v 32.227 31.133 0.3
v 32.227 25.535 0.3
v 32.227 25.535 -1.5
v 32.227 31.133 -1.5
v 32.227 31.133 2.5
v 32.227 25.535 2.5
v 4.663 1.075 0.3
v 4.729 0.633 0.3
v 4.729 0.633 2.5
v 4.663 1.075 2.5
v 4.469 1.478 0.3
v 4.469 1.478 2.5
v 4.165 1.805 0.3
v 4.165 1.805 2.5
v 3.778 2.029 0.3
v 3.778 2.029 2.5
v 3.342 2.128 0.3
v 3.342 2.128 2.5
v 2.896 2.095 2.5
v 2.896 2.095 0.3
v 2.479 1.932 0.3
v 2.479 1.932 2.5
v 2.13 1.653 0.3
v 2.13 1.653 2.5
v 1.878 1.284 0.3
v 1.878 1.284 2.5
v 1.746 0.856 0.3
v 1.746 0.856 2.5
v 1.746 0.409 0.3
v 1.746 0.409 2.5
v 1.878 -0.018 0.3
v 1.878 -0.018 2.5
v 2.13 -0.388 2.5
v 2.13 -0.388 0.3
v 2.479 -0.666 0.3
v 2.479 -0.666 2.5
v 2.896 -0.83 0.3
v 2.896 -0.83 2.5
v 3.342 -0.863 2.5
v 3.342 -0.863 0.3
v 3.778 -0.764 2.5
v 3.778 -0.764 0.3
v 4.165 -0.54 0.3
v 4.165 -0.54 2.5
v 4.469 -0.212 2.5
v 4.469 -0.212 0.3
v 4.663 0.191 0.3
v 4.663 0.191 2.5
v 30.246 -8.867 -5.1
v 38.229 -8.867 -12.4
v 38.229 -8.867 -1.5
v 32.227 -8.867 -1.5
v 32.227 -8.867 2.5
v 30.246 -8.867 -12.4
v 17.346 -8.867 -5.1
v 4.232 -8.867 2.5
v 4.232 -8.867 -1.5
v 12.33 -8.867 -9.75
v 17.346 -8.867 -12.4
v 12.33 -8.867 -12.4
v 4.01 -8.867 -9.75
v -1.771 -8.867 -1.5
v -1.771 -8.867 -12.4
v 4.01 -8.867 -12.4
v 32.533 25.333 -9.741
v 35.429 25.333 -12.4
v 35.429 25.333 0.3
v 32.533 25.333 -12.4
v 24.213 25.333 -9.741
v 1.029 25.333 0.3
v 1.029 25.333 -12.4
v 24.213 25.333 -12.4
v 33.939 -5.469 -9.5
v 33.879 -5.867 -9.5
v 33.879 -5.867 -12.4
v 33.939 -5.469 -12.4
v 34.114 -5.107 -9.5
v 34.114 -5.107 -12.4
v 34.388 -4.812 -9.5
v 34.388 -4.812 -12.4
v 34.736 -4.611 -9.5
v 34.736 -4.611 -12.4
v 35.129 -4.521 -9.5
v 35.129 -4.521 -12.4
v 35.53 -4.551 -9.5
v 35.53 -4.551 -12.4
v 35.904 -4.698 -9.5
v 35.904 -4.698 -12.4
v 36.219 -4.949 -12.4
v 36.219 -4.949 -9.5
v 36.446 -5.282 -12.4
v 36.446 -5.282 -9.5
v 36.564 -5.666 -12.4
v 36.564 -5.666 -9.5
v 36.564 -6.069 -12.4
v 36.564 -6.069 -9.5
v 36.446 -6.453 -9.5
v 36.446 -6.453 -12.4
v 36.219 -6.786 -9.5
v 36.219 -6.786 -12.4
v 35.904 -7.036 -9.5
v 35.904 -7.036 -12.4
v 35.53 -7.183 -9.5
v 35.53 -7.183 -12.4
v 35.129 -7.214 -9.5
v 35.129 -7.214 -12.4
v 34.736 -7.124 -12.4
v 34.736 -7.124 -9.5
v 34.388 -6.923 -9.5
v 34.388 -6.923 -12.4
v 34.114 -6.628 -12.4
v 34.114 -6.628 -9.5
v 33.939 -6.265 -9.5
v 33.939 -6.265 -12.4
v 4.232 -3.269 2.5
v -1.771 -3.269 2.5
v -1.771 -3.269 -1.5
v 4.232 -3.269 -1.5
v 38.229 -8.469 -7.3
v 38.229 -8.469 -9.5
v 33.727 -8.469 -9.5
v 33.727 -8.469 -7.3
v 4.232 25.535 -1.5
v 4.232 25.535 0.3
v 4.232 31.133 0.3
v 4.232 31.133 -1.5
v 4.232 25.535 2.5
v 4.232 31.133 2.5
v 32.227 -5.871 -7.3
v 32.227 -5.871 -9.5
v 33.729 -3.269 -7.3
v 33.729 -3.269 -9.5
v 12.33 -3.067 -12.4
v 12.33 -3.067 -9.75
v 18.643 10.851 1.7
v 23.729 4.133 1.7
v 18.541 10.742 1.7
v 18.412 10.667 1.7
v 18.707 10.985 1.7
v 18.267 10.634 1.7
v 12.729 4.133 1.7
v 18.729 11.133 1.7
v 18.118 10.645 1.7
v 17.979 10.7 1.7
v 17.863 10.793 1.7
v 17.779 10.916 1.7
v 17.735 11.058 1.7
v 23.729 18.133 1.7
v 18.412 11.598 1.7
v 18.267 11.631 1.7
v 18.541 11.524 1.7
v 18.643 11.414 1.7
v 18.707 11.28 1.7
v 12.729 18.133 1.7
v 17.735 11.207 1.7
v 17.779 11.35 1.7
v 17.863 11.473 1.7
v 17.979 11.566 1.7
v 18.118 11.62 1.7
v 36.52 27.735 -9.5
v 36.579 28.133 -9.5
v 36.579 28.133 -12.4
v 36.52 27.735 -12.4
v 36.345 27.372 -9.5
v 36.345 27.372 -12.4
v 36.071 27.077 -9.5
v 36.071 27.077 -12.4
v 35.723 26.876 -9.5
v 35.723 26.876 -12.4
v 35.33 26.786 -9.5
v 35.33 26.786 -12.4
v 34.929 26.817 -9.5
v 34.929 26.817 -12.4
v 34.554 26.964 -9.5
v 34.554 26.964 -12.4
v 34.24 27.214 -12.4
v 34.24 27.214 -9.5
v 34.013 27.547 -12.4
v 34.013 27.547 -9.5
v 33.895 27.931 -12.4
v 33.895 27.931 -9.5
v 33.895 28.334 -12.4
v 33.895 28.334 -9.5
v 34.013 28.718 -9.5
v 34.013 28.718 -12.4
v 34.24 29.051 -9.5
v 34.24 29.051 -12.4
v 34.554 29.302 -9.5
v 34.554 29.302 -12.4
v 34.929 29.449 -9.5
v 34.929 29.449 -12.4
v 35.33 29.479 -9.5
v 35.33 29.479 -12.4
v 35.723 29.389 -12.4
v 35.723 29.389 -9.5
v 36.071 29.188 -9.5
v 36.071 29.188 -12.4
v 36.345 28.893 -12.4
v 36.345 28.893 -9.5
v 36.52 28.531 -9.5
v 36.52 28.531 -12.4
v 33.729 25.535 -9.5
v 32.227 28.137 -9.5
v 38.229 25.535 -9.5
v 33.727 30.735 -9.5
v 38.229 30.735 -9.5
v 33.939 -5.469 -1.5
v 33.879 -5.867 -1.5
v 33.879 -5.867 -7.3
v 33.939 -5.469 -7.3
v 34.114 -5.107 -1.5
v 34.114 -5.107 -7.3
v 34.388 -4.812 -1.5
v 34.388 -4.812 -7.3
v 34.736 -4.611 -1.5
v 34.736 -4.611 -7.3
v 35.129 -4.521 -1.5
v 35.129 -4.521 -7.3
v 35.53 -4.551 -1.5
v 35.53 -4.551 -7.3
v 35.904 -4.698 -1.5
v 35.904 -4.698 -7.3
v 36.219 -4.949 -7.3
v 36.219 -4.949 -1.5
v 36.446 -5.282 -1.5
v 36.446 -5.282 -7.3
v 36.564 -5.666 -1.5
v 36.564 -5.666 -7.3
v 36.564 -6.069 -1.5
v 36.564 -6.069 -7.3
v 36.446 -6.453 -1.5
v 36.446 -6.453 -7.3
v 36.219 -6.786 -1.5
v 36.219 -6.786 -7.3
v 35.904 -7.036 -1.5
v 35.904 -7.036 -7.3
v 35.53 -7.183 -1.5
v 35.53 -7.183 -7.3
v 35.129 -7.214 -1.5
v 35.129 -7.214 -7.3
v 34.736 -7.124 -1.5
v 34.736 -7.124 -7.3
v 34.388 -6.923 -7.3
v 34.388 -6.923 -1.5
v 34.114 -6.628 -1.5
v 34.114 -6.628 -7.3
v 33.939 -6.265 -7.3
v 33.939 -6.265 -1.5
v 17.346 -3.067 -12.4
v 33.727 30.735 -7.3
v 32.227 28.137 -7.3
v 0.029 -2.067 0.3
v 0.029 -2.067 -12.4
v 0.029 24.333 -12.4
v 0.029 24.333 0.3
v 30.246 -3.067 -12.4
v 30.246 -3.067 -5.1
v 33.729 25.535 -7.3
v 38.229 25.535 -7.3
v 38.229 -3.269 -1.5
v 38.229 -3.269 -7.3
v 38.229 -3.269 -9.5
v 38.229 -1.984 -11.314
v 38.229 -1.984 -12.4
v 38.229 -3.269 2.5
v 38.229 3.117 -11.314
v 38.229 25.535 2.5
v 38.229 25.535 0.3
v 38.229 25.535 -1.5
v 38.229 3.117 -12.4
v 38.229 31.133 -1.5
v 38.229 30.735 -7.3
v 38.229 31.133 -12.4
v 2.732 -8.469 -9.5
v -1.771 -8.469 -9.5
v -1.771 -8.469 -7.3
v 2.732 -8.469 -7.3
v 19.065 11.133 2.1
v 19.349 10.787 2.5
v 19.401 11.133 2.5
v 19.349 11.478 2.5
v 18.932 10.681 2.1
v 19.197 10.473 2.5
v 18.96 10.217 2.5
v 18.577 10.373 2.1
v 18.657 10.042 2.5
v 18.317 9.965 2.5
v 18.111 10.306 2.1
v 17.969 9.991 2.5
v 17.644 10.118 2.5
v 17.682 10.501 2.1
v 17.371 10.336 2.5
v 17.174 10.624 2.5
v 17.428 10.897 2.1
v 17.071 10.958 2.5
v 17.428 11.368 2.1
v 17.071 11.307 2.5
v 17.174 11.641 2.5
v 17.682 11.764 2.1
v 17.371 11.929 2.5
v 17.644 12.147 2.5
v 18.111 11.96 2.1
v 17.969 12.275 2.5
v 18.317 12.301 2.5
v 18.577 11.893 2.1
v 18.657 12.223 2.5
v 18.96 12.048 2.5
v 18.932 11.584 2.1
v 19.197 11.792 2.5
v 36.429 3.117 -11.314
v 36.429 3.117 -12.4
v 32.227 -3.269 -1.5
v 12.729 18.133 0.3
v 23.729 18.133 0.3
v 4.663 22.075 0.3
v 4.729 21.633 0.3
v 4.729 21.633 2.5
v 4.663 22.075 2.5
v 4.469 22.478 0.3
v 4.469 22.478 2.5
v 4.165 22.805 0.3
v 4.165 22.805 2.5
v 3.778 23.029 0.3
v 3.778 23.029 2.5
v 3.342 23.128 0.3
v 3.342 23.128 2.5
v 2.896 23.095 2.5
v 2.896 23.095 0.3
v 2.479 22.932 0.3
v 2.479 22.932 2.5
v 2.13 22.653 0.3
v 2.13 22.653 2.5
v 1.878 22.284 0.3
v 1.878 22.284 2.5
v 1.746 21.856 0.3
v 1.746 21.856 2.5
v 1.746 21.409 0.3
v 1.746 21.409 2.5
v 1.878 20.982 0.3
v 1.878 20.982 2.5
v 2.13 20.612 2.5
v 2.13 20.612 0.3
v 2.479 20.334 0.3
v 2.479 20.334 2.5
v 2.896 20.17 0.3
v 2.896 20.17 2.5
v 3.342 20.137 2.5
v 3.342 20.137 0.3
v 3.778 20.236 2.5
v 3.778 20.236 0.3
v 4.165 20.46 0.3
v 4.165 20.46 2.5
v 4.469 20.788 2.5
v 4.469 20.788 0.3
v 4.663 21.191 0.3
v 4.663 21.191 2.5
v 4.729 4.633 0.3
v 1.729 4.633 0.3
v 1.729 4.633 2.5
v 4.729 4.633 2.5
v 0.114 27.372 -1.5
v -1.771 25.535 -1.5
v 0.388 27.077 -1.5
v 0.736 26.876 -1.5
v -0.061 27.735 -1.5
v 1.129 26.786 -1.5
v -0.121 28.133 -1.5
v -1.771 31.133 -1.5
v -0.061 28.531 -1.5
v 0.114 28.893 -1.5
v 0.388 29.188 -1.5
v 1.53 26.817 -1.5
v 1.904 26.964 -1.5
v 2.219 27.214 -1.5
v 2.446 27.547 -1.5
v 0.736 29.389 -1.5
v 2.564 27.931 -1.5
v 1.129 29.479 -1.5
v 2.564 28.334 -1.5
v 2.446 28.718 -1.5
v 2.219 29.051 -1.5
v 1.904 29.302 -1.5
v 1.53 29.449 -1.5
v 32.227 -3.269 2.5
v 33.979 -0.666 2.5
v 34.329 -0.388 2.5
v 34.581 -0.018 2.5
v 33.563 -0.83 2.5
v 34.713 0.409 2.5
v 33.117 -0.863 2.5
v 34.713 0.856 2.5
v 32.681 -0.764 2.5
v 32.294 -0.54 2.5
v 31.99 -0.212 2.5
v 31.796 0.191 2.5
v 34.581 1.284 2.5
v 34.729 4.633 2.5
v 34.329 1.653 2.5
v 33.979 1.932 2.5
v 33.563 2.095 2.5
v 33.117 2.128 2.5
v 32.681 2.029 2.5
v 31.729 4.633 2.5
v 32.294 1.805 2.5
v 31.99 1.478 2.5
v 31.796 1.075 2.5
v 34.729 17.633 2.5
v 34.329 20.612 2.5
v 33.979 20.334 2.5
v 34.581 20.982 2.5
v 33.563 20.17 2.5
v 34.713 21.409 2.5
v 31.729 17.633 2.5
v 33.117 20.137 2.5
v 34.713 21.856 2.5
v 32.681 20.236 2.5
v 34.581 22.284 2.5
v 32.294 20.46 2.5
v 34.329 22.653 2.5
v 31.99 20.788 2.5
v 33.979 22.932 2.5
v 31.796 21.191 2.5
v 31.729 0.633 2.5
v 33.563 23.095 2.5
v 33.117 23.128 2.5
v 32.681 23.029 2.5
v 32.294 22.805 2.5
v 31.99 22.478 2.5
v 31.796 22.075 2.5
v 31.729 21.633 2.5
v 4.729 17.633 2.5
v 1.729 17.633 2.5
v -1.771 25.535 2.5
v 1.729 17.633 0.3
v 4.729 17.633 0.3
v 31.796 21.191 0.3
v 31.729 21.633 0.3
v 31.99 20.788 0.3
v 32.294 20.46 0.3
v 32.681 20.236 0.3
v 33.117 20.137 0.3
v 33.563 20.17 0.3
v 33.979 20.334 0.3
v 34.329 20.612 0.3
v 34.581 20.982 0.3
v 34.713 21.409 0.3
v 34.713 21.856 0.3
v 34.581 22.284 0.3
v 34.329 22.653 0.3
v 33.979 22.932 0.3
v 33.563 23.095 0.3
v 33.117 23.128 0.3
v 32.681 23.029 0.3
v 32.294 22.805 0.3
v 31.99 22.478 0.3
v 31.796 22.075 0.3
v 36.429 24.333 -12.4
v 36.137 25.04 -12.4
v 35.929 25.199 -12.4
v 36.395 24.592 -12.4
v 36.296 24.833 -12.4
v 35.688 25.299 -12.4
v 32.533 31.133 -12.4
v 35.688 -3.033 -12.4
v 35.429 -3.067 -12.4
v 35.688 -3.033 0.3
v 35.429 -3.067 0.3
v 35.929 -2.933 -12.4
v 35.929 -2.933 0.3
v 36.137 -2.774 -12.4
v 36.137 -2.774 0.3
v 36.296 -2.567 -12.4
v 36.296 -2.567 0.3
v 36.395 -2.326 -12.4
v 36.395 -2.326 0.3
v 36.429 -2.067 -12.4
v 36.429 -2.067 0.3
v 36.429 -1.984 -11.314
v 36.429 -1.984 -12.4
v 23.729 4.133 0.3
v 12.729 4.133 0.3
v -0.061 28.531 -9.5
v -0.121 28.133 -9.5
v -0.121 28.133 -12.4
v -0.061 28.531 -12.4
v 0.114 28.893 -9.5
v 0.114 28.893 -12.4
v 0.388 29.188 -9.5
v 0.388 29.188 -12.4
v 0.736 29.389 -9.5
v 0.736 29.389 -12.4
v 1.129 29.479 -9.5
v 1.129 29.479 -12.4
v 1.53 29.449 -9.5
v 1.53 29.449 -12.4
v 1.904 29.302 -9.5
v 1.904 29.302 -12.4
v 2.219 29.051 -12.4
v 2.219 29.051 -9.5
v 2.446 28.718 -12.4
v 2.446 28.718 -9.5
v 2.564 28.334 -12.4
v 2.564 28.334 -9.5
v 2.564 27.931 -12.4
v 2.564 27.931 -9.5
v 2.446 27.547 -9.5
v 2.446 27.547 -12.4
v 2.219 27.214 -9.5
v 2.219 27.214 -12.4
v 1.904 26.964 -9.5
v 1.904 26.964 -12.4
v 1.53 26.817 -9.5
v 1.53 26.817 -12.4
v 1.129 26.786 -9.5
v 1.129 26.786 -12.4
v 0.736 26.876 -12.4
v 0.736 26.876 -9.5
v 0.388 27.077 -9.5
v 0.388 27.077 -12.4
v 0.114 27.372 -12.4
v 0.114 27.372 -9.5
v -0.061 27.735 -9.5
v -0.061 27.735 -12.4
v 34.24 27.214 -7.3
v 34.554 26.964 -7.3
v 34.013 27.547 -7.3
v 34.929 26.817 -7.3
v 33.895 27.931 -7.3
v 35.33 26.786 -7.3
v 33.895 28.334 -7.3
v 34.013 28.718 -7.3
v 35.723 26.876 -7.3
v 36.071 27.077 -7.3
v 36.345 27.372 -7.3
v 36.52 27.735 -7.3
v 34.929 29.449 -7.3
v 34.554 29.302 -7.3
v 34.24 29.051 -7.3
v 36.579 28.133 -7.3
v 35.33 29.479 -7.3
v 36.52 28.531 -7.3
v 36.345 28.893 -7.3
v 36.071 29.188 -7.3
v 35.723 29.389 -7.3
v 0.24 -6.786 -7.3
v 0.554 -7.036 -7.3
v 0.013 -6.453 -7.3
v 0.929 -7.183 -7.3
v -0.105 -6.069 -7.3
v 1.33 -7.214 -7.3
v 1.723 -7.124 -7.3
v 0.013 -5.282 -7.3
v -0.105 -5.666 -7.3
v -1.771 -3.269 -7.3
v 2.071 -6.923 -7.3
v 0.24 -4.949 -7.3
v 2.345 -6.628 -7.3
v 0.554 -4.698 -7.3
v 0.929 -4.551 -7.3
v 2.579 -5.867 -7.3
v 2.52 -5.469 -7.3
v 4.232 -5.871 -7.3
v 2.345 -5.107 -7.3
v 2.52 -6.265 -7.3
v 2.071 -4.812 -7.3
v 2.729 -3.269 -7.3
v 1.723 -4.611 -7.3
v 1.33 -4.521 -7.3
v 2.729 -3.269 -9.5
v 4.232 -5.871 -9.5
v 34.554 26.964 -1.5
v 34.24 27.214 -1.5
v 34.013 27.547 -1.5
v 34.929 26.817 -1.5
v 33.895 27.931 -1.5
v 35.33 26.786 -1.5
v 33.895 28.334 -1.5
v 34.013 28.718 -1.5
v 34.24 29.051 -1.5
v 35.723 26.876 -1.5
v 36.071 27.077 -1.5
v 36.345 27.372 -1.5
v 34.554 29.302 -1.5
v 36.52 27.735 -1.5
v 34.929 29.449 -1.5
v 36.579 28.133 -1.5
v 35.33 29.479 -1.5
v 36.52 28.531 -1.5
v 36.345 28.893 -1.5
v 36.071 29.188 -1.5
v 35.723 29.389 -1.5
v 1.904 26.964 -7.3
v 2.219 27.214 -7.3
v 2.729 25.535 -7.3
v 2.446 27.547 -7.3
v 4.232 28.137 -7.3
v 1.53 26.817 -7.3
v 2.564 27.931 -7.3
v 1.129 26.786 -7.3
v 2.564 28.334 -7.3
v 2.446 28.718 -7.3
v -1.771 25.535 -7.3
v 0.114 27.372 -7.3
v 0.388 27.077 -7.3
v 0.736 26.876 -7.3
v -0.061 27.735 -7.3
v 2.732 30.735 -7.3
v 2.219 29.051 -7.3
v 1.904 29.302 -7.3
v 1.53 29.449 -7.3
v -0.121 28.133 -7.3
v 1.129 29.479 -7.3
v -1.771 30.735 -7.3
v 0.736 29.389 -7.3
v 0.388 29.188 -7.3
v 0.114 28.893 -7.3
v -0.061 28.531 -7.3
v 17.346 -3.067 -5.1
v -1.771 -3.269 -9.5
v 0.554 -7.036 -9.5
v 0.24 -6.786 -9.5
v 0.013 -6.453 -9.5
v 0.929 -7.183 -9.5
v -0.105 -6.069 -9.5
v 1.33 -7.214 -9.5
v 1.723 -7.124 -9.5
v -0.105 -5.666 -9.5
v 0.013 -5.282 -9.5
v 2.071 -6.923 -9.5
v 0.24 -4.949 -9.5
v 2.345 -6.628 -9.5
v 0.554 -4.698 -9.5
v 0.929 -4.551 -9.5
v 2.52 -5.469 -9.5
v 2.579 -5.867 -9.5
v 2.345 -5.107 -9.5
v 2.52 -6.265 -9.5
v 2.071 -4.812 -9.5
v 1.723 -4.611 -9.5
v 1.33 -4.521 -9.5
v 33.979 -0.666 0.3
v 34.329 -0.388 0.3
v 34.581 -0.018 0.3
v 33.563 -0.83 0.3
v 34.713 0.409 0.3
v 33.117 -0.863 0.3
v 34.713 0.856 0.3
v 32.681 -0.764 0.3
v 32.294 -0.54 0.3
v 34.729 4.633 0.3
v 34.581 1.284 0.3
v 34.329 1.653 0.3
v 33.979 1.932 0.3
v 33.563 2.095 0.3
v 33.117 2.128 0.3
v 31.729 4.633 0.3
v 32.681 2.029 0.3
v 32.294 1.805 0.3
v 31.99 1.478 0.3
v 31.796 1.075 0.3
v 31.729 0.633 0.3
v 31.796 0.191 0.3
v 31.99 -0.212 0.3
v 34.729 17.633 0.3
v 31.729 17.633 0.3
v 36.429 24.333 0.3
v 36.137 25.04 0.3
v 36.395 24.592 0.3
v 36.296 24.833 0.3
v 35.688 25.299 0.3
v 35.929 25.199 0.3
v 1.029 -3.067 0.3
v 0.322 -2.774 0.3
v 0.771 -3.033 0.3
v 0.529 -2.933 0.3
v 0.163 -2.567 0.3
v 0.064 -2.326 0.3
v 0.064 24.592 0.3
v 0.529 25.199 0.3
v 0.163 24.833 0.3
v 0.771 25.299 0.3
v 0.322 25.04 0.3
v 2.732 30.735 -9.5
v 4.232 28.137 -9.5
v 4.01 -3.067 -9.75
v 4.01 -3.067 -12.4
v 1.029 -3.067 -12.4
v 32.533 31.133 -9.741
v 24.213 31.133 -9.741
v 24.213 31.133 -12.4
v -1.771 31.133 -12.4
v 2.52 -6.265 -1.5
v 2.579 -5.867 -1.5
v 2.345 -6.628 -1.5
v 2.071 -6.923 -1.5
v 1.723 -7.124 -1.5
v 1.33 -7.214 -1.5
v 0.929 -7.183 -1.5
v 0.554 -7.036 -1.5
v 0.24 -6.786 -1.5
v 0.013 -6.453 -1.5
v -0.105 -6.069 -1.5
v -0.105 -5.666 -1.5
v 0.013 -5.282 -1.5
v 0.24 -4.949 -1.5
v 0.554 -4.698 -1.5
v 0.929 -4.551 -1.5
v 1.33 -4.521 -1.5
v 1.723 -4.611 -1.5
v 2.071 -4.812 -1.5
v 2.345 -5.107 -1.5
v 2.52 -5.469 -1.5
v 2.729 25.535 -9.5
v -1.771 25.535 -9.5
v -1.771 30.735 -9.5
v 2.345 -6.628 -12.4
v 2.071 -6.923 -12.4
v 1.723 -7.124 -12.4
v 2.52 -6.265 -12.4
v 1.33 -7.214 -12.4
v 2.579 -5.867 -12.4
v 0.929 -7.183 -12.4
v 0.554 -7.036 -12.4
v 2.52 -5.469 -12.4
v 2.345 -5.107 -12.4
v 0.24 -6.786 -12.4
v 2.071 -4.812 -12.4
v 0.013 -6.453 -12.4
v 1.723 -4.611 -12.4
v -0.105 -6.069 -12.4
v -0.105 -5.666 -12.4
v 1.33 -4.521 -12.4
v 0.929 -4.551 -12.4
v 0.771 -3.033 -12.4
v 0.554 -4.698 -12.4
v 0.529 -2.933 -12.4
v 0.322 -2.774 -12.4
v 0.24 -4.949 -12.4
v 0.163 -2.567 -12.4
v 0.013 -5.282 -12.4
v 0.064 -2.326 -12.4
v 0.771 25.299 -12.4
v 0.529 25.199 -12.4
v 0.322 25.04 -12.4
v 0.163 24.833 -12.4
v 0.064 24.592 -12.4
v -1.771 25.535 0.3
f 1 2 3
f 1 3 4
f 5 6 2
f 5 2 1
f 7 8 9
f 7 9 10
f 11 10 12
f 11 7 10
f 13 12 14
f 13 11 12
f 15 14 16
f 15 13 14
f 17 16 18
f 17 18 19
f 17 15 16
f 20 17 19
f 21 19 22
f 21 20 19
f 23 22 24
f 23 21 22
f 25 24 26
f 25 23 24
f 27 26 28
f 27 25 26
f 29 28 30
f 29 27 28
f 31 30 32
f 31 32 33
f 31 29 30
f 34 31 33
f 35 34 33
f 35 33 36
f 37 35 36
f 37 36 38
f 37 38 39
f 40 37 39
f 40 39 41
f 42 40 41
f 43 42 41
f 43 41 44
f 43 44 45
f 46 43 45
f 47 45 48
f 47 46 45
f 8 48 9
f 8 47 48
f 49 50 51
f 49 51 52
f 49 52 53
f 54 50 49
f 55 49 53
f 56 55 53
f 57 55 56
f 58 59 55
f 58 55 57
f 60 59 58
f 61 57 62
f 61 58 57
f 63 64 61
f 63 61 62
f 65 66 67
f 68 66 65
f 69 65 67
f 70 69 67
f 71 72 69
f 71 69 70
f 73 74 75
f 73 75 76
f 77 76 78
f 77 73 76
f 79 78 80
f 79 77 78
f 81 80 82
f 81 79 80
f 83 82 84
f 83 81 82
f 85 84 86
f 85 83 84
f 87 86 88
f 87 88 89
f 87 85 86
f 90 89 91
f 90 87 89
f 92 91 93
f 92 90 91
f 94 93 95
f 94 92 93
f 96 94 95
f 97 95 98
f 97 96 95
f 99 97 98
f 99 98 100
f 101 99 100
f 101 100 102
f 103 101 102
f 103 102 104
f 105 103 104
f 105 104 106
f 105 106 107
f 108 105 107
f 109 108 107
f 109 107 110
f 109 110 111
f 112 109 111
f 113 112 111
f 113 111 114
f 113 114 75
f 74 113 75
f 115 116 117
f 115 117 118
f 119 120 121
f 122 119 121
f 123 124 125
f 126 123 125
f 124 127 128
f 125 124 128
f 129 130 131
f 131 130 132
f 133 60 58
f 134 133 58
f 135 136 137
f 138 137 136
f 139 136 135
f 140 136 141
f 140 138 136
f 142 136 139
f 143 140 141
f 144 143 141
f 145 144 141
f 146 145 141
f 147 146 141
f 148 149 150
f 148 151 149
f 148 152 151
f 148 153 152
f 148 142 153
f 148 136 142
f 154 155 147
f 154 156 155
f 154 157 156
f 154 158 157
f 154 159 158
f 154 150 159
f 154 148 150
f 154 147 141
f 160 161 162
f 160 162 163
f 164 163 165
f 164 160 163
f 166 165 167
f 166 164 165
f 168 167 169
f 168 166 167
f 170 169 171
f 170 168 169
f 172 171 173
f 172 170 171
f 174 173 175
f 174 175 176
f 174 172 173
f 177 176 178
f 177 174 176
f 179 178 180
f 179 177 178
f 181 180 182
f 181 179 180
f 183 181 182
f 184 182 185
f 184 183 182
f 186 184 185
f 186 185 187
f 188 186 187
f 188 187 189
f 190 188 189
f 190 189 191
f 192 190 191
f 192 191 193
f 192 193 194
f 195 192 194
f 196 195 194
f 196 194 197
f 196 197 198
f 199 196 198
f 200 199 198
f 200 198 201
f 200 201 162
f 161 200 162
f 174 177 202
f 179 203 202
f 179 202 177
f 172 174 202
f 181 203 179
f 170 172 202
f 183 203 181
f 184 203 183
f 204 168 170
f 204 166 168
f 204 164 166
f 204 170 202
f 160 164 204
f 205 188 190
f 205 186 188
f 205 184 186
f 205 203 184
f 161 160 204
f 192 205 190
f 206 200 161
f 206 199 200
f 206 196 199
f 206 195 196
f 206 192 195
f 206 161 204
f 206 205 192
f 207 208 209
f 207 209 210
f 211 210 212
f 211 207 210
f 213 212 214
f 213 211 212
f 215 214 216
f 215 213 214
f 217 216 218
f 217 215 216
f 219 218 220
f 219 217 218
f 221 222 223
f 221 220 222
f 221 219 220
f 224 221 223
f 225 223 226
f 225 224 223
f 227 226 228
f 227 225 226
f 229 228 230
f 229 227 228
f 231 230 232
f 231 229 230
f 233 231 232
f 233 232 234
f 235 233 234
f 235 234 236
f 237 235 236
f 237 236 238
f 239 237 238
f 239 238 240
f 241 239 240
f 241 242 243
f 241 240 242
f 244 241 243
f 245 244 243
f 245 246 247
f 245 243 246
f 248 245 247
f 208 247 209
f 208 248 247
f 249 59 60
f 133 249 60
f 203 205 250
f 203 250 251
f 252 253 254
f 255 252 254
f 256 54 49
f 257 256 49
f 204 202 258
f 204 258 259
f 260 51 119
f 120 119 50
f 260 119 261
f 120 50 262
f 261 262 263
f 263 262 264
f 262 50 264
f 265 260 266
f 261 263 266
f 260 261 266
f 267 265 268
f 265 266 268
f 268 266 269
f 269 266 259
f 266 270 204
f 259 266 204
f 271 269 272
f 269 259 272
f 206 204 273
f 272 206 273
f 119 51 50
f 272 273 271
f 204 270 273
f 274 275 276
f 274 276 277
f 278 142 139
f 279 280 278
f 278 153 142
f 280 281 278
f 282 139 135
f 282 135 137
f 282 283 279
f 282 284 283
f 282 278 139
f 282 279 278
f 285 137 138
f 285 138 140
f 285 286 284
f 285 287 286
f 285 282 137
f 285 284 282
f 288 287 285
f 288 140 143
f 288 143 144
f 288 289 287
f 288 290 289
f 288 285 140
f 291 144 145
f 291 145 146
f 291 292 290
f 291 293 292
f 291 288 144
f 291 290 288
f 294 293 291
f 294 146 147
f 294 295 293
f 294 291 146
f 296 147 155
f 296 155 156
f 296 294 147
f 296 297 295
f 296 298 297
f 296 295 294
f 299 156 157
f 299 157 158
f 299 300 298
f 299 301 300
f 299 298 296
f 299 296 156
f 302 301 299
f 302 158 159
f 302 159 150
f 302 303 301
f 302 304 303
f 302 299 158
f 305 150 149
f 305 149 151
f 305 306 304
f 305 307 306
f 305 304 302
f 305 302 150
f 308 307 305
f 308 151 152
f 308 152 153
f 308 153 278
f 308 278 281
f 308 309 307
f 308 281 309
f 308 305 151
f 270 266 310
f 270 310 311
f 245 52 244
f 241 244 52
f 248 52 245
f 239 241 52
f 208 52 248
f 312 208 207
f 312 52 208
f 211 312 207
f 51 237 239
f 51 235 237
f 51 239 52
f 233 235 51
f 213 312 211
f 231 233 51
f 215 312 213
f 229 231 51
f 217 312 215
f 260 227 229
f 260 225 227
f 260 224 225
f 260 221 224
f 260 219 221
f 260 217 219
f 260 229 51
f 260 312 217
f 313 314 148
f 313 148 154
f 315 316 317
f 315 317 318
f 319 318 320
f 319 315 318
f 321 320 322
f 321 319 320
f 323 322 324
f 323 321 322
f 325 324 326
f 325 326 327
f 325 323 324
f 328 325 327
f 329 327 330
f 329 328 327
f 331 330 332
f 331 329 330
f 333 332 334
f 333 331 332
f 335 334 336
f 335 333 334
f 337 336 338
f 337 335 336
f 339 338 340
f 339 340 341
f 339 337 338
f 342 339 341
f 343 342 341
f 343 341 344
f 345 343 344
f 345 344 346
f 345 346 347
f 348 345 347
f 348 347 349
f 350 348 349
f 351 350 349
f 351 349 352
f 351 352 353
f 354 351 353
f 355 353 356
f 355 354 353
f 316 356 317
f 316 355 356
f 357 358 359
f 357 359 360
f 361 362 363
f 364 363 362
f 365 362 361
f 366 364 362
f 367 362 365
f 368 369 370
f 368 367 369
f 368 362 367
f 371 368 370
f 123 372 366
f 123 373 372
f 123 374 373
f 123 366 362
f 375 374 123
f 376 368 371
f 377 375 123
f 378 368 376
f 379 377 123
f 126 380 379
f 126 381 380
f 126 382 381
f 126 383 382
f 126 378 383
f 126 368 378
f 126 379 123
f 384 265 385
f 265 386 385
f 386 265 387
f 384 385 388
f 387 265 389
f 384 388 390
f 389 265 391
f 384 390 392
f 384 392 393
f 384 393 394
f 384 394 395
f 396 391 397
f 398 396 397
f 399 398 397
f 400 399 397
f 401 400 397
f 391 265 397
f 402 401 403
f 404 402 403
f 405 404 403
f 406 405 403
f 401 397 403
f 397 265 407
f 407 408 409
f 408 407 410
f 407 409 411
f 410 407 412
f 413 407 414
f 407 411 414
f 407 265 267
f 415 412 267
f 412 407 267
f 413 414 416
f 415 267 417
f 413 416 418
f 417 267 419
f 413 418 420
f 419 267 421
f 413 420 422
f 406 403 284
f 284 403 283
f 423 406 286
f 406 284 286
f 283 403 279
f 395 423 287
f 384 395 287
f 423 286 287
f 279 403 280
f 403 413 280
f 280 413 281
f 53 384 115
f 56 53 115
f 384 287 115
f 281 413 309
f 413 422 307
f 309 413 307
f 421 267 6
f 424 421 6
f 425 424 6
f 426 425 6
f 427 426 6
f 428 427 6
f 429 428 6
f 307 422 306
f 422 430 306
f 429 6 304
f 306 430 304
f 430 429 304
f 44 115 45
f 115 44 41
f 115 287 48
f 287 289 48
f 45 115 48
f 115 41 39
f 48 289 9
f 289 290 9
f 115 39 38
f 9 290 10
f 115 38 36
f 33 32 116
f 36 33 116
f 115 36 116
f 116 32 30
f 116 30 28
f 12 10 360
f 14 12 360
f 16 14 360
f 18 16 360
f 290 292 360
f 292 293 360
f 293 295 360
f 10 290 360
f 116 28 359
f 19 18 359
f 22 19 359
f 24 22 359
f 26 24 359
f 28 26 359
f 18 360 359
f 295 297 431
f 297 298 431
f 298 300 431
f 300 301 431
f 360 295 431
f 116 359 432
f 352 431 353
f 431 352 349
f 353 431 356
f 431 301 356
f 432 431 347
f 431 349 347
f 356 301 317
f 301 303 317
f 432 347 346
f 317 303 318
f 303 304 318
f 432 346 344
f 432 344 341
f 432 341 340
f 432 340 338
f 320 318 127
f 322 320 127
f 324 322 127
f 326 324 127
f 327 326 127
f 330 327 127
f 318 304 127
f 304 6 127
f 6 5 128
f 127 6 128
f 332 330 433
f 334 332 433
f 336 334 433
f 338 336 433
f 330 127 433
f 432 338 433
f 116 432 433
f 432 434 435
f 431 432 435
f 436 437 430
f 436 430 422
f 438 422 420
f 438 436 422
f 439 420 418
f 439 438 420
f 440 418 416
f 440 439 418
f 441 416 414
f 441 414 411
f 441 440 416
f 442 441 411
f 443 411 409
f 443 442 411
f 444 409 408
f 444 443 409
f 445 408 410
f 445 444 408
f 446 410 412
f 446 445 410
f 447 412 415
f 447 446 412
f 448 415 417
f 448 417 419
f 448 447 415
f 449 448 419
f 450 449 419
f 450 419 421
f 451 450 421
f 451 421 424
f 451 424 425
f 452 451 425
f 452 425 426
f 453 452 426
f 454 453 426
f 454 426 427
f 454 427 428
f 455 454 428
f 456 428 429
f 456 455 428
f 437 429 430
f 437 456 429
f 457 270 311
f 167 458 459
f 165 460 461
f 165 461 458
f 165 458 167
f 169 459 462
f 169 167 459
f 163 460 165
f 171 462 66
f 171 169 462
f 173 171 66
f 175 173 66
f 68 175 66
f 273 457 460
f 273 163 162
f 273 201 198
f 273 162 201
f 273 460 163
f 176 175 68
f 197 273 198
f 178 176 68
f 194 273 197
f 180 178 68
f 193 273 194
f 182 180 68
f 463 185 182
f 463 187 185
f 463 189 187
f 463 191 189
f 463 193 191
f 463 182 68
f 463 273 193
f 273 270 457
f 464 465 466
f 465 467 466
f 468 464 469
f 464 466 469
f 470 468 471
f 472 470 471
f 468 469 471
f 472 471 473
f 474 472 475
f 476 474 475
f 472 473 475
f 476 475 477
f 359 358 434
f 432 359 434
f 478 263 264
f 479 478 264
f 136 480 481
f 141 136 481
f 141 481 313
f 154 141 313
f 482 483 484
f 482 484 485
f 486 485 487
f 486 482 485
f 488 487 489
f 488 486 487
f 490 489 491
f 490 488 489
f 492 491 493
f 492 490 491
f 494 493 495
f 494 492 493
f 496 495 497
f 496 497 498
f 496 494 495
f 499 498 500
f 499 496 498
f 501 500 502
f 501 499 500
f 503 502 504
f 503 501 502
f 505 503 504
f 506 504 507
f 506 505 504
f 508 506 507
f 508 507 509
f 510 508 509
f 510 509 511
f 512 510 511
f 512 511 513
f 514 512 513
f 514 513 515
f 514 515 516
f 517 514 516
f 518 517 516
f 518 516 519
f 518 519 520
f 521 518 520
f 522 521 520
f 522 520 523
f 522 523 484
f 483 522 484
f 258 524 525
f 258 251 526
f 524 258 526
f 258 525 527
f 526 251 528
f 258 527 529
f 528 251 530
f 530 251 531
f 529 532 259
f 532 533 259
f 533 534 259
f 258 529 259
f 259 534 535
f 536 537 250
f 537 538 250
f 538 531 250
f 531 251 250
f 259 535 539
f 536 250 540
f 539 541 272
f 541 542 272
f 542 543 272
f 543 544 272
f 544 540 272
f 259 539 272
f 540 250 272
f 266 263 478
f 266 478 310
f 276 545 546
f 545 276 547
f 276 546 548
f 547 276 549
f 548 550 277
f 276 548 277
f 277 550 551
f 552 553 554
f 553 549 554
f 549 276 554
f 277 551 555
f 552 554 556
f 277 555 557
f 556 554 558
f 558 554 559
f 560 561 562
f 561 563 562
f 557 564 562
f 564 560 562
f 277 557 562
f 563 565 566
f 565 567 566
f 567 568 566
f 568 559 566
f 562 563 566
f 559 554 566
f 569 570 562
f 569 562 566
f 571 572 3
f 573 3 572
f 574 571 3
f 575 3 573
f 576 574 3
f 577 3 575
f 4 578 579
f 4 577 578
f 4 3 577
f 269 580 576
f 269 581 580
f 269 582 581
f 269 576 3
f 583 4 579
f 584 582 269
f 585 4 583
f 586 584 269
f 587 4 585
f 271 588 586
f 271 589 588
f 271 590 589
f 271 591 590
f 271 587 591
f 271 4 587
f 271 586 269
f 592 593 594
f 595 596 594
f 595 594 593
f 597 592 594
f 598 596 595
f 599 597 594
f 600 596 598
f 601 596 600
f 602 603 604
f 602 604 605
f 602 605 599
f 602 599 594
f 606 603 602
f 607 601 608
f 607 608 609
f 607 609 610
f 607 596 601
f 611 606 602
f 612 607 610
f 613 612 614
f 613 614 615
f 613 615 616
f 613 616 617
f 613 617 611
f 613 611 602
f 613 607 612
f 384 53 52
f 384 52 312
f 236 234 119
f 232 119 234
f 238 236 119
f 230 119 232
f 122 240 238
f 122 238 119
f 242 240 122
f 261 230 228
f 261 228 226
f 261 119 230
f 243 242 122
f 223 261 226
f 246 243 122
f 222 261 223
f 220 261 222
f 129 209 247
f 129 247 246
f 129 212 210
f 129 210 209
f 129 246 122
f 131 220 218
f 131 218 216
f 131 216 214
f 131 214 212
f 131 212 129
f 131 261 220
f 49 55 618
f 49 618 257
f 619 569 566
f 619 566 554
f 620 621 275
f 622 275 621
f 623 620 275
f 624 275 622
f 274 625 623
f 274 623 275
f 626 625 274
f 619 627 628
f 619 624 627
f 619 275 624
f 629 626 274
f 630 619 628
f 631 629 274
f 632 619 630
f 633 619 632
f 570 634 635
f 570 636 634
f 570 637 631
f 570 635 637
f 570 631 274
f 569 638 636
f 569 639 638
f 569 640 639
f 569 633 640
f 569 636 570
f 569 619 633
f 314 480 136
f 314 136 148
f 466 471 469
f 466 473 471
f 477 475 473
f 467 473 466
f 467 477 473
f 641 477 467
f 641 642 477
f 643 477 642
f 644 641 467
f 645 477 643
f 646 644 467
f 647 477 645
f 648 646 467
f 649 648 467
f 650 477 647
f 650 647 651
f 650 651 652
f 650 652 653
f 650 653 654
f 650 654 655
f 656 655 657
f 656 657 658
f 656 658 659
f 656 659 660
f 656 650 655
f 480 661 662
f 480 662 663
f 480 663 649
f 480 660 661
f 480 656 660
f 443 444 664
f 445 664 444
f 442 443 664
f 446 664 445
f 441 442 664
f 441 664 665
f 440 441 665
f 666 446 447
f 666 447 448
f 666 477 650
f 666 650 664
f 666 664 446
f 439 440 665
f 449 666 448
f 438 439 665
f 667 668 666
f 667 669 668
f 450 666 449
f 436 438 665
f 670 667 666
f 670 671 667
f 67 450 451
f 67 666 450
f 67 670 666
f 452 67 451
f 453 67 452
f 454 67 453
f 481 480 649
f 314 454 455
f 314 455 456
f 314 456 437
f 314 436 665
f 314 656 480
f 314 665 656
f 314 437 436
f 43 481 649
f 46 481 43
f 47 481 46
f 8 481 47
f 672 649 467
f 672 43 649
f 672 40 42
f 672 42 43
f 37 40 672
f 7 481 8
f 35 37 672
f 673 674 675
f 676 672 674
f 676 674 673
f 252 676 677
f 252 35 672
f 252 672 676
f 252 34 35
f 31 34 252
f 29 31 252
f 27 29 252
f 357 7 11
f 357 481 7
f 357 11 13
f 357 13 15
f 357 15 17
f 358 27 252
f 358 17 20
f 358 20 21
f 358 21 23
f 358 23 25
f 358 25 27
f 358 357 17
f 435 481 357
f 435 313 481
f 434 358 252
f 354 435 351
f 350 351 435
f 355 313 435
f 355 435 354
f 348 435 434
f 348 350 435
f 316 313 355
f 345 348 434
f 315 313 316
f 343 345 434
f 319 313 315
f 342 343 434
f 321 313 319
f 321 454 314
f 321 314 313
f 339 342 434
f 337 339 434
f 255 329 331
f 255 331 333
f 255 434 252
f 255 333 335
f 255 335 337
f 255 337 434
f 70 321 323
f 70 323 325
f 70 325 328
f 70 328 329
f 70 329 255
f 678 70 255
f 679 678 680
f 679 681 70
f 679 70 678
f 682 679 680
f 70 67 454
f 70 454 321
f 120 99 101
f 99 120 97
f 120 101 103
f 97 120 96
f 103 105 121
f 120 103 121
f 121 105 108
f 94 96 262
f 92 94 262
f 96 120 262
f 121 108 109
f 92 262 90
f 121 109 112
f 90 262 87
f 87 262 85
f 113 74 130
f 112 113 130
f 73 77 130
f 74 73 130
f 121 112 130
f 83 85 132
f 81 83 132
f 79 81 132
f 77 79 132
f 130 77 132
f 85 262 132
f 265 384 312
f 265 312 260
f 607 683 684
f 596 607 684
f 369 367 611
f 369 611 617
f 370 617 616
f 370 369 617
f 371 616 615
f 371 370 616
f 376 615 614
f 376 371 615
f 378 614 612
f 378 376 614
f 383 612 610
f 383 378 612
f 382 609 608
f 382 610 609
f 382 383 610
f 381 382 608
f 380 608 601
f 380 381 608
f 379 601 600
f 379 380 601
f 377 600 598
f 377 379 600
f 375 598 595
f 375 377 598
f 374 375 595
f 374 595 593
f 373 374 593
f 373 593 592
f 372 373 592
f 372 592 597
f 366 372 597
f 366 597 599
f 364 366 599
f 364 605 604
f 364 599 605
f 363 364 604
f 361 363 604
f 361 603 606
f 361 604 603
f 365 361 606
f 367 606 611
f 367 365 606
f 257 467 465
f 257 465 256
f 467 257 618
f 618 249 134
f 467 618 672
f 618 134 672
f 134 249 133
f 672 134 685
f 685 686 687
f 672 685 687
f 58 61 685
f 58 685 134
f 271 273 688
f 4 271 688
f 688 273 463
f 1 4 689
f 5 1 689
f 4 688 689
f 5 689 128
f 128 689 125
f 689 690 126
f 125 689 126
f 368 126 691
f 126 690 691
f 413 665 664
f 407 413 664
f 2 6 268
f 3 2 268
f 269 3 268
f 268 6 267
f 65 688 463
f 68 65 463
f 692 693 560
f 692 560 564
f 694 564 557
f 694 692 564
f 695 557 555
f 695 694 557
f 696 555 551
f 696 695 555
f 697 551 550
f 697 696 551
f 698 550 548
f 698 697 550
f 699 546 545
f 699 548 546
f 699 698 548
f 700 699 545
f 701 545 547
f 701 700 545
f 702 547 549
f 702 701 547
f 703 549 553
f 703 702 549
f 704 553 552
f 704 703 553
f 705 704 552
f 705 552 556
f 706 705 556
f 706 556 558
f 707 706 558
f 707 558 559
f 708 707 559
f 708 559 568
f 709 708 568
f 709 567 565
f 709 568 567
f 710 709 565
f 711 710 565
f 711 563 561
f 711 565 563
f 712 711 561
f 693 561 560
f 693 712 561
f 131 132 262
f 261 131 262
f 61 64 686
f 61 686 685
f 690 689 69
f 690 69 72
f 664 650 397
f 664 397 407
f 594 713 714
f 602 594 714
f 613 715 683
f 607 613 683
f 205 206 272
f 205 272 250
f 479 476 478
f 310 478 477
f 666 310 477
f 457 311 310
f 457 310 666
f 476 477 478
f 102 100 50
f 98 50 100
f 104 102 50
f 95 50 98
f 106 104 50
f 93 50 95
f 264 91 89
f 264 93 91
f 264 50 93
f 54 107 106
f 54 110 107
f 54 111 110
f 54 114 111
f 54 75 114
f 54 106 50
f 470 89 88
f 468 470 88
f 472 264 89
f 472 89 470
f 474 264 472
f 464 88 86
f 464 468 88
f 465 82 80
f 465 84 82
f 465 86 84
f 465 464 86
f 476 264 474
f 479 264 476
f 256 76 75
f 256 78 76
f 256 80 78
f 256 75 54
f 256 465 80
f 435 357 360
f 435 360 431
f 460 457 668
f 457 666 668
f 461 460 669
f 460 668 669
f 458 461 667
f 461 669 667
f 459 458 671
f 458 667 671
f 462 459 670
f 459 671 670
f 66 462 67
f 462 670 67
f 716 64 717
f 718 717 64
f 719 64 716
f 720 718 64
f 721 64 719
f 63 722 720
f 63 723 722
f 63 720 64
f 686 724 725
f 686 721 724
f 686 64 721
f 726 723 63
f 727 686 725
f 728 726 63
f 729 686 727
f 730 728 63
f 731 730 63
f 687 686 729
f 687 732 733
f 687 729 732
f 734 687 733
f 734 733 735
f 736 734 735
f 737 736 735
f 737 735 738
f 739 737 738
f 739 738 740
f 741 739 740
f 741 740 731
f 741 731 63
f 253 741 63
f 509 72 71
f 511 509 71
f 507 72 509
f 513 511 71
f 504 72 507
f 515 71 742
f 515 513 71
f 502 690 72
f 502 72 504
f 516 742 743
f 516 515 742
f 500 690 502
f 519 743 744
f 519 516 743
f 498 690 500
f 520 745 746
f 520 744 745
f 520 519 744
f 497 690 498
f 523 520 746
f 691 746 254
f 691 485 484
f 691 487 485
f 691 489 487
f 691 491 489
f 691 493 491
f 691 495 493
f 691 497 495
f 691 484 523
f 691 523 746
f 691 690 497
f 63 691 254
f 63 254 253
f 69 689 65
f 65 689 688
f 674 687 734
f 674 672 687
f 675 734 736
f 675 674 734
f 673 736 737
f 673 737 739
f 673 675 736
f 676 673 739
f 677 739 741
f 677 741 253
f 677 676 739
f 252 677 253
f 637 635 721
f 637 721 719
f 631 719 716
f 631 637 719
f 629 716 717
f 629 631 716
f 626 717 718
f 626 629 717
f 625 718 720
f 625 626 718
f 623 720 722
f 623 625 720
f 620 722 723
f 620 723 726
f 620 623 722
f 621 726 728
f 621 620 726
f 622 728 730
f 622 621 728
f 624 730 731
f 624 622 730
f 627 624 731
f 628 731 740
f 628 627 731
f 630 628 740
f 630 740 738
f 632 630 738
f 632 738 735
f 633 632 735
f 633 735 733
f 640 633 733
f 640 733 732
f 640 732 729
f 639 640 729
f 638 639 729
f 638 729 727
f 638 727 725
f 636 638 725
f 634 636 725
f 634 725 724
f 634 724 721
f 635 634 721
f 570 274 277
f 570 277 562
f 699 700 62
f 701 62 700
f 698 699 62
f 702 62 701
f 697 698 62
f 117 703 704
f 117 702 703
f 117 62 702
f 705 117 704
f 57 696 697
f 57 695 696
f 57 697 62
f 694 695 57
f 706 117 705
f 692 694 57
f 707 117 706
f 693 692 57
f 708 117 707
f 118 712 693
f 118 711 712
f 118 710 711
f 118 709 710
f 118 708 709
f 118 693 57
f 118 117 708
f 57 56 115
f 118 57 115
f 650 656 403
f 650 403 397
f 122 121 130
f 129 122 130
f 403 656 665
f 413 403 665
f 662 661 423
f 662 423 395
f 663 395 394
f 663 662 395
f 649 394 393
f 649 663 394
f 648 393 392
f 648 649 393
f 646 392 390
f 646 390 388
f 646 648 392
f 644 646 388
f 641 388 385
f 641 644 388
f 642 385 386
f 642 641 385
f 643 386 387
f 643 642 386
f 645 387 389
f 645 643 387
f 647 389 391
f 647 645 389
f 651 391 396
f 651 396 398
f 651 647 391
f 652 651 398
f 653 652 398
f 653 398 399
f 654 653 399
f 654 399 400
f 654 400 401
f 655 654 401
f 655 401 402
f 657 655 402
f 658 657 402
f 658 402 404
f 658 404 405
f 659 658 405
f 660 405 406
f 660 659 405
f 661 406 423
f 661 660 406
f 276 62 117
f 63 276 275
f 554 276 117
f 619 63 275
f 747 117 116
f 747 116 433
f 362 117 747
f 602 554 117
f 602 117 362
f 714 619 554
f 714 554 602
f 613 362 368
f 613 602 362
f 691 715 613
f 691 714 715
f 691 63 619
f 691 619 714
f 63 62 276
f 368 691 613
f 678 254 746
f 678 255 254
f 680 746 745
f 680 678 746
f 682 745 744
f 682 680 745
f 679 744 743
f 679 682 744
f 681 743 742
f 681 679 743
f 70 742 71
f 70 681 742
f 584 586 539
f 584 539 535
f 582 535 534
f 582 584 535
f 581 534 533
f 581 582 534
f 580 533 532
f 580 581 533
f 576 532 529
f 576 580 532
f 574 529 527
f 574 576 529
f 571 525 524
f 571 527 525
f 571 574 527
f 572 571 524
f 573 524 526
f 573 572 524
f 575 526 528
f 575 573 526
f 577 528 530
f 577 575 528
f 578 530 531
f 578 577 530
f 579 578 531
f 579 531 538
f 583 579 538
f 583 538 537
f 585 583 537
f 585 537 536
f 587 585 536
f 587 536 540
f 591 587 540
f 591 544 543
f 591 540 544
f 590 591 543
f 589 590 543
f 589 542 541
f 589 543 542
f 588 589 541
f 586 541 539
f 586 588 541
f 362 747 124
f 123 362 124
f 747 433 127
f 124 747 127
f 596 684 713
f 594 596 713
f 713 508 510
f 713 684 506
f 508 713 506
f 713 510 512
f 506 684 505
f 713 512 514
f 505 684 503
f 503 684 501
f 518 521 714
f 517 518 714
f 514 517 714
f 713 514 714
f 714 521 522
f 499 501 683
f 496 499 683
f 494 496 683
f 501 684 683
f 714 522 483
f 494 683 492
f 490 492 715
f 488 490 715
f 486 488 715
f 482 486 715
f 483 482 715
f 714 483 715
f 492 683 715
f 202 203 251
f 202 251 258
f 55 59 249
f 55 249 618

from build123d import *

# Parameters (mm, degrees)
SKETCH_1_W               = 40
SKETCH_1_H               = 40
EXTRUDE_1_DEPTH          = 12.7
CUT_EXTRUDE_2_DEPTH      = 0.7
CUT_EXTRUDE_2_DEPTH_BACK = 1.5
SKETCH_8_W               = 36.4
SKETCH_8_H               = 28.4
CUT_EXTRUDE_4_DEPTH      = 12.7
SKETCH_10_R              = 0.5
SKETCH_10_R_2            = 1.5
SKETCH_10_W              = 3
SKETCH_10_H              = 13
EXTRUDE_2_DEPTH          = 2.2
CUT_EXTRUDE_START        = -12.7
SKETCH_13_R              = 1.35
CUT_EXTRUDE_6_DEPTH      = 12.7
FILLET_1_R               = 1
SKETCH_14_W              = 8.31999735
SKETCH_14_H              = 2.64999918
CUT_EXTRUDE_8_DEPTH      = 5.8
SKETCH_15_W              = 12.8999835
SKETCH_15_H              = 7.3
CUT_EXTRUDE_9_DEPTH      = 5.8
SKETCH_16_W              = 1.085536683
SKETCH_16_H              = 5.100270408
CUT_EXTRUDE_10_DEPTH     = 1.8
SKETCH_17_W              = 8.31999735
SKETCH_17_H              = 2.65925193
CUT_EXTRUDE_11_DEPTH     = 5.8
SKETCH_23_W              = 6.0022214
SKETCH_23_H              = 5.598076211
SKETCH_23_H_2            = 5.598076212
CUT_EXTRUDE_12_DEPTH     = 4
SKETCH_24_W              = 11
SKETCH_24_H              = 14
CUT_EXTRUDE_14_DEPTH     = 1.4


with BuildPart() as part:
    # 草图1 → 凸台-拉伸1 (new body)
    with BuildSketch(Plane(origin=(0, 0, -12.4), x_dir=(-1, 0, 0), z_dir=(0, 0, -1))):
        with Locations((-18.22949197, 11.132690632)):
            Rectangle(SKETCH_1_W, SKETCH_1_H)
    extrude(amount=-EXTRUDE_1_DEPTH)

    # 草图2 → 切除-拉伸2 (cut, two sides: drawn at the far end of the back side and taken through both)
    with BuildSketch(Plane.XY.offset(-8).offset(-CUT_EXTRUDE_2_DEPTH_BACK)):
        Polygon((-2.01828663, -8.469233156), (2.73171337, -8.469233156), (4.23171337, -5.871156945), (2.72949197, -3.269233156), (-2.01828663, -3.269233156), align=None)
        Polygon((-2.01828663, 25.534614421), (-2.01828663, 30.734614421), (2.73171337, 30.734614421), (4.23171337, 28.13653821), (2.72949197, 25.534614421), align=None)
        Polygon((38.47727057, 30.734614421), (33.72727057, 30.734614421), (32.22727057, 28.13653821), (33.72949197, 25.534614421), (38.47727057, 25.534614421), align=None)
        Polygon((38.47727057, -3.269233156), (38.47727057, -8.469233156), (33.72727057, -8.469233156), (32.22727057, -5.871156945), (33.72949197, -3.269233156), align=None)
    extrude(amount=CUT_EXTRUDE_2_DEPTH + CUT_EXTRUDE_2_DEPTH_BACK, mode=Mode.SUBTRACT)

    # 草图8 → 切除-拉伸4 (cut)
    with BuildSketch(Plane(origin=(0, 0, -12.4), x_dir=(-1, 0, 0), z_dir=(0, 0, -1))):
        with Locations((-18.22949197, 11.132690632)):
            Rectangle(SKETCH_8_W, SKETCH_8_H)
    extrude(amount=-CUT_EXTRUDE_4_DEPTH, mode=Mode.SUBTRACT)

    # 草图13 → 切除-拉伸6 (cut)
    with BuildSketch(Plane(origin=(0, 0, -12.4), x_dir=(-1, 0, 0), z_dir=(0, 0, -1)).offset(CUT_EXTRUDE_START)):
        with Locations((-35.22949197, -5.867309368)):
            Circle(SKETCH_13_R)
        with Locations(Location((-1.22949197, -5.867309368, 0), (0, 0, 180))):
            Circle(SKETCH_13_R)
        with Locations((-1.22949197, 28.132690632)):
            Circle(SKETCH_13_R)
        with Locations(Location((-35.22949197, 28.132690632, 0), (0, 0, 180))):
            Circle(SKETCH_13_R)
    extrude(amount=CUT_EXTRUDE_6_DEPTH, mode=Mode.SUBTRACT)

    # 圆角1
    fillet_1_edges = [part.edges().sort_by_distance(p)[0] for p in [
        (0.02949197, 25.332690632, -6.05),
        (0.02949197, -3.067309368, -6.05),
        (36.42949197, -3.067309368, -6.05),
        (36.42949197, 25.332690632, -6.05),
    ]]
    fillet(fillet_1_edges, radius=FILLET_1_R)

    # 草图14 → 切除-拉伸8 (cut)
    with BuildSketch(Plane.XZ.offset(8.867309368)):
        with Locations((8.169941285, -11.07500041)):
            Rectangle(SKETCH_14_W, SKETCH_14_H)
    extrude(amount=-CUT_EXTRUDE_8_DEPTH, mode=Mode.SUBTRACT)

    # 草图15 → 切除-拉伸9 (cut)
    with BuildSketch(Plane.XZ.offset(8.867309368)):
        with Locations((23.79587104, -8.75)):
            Rectangle(SKETCH_15_W, SKETCH_15_H)
    extrude(amount=-CUT_EXTRUDE_9_DEPTH, mode=Mode.SUBTRACT)

    # 草图16 → 切除-拉伸10 (cut)
    with BuildSketch(Plane(origin=(38.22949197, 0, 0), x_dir=(0, 0, -1), z_dir=(1, 0, 0))):
        with Locations((11.857231659, 0.566559812)):
            Rectangle(SKETCH_16_W, SKETCH_16_H)
    extrude(amount=-CUT_EXTRUDE_10_DEPTH, mode=Mode.SUBTRACT)

    # 草图17 → 切除-拉伸11 (cut)
    with BuildSketch(Plane(origin=(0, 31.132690632, 0), x_dir=(1, 0, 0), z_dir=(0, 1, 0))):
        with Locations((28.372981895, 11.070374035)):
            Rectangle(SKETCH_17_W, SKETCH_17_H)
    extrude(amount=-CUT_EXTRUDE_11_DEPTH, mode=Mode.SUBTRACT)

    # 草图23 → 切除-拉伸12 (cut)
    with BuildSketch(Plane.XY.offset(2.5)):
        with Locations((35.22838127, 28.333652527)):
            Rectangle(SKETCH_23_W, SKETCH_23_H)
        with Locations((35.22838127, -6.068271262)):
            Rectangle(SKETCH_23_W, SKETCH_23_H_2)
        with Locations((1.23060267, -6.068271262)):
            Rectangle(SKETCH_23_W, SKETCH_23_H_2)
        with Locations((1.23060267, 28.333652527)):
            Rectangle(SKETCH_23_W, SKETCH_23_H)
    extrude(amount=-CUT_EXTRUDE_12_DEPTH, mode=Mode.SUBTRACT)


with BuildPart() as body_2:
    # 草图10 → 凸台-拉伸2 (new body)
    with BuildSketch(Plane.XY.offset(0.3)):
        Polygon((-1.77050803, 25.534614421), (4.23171337, 25.534614421), (4.23171337, 31.132690632), (32.22727057, 31.132690632), (32.22727057, 25.534614421), (38.22949197, 25.534614421), (38.22949197, -3.269233156), (32.22727057, -3.269233156), (32.22727057, -8.867309368), (4.23171337, -8.867309368), (4.23171337, -3.269233156), (-1.77050803, -3.269233156), align=None)
        with Locations((18.22949197, 11.132690632)):
            Circle(SKETCH_10_R, mode=Mode.SUBTRACT)
        with Locations((3.22949197, 0.632690632)):
            Circle(SKETCH_10_R_2, mode=Mode.SUBTRACT)
        with Locations((3.22949197, 21.632690632)):
            Circle(SKETCH_10_R_2, mode=Mode.SUBTRACT)
        with Locations(Location((33.22949197, 21.632690632, 0), (0, 0, 180))):
            Circle(SKETCH_10_R_2, mode=Mode.SUBTRACT)
        with Locations(Location((33.22949197, 0.632690632, 0), (0, 0, 180))):
            Circle(SKETCH_10_R_2, mode=Mode.SUBTRACT)
        with Locations((3.22949197, 11.132690632)):
            Rectangle(SKETCH_10_W, SKETCH_10_H, mode=Mode.SUBTRACT)
        with Locations((33.22949197, 11.132690632)):
            Rectangle(SKETCH_10_W, SKETCH_10_H, mode=Mode.SUBTRACT)
    extrude(amount=EXTRUDE_2_DEPTH)

    # 草图24 → 切除-拉伸14 (cut)
    with BuildSketch(Plane(origin=(0, 0, 0.3), x_dir=(-1, 0, 0), z_dir=(0, 0, -1))):
        with Locations((-18.22949197, 11.132690632)):
            Rectangle(SKETCH_24_W, SKETCH_24_H)
    extrude(amount=-CUT_EXTRUDE_14_DEPTH, mode=Mode.SUBTRACT)

    # 草图22 → 切除-旋转3 (revolve, cut)
    with BuildSketch(Plane(origin=(0, 11.132690632, 0), x_dir=(-1, 0, 0), z_dir=(0, -1, 0))):
        Polygon((-18.72949197, -1.7), (-19.400771675, -2.5), (-18.22949197, -2.5), (-18.22949197, -1.7), align=None)
    revolve(axis=Axis((18.22949197, 11.132690632, 5.06186702), (0, 0, -1)), mode=Mode.SUBTRACT)

    # Combine 1: union part
    add(part.part)


solid = body_2.part
